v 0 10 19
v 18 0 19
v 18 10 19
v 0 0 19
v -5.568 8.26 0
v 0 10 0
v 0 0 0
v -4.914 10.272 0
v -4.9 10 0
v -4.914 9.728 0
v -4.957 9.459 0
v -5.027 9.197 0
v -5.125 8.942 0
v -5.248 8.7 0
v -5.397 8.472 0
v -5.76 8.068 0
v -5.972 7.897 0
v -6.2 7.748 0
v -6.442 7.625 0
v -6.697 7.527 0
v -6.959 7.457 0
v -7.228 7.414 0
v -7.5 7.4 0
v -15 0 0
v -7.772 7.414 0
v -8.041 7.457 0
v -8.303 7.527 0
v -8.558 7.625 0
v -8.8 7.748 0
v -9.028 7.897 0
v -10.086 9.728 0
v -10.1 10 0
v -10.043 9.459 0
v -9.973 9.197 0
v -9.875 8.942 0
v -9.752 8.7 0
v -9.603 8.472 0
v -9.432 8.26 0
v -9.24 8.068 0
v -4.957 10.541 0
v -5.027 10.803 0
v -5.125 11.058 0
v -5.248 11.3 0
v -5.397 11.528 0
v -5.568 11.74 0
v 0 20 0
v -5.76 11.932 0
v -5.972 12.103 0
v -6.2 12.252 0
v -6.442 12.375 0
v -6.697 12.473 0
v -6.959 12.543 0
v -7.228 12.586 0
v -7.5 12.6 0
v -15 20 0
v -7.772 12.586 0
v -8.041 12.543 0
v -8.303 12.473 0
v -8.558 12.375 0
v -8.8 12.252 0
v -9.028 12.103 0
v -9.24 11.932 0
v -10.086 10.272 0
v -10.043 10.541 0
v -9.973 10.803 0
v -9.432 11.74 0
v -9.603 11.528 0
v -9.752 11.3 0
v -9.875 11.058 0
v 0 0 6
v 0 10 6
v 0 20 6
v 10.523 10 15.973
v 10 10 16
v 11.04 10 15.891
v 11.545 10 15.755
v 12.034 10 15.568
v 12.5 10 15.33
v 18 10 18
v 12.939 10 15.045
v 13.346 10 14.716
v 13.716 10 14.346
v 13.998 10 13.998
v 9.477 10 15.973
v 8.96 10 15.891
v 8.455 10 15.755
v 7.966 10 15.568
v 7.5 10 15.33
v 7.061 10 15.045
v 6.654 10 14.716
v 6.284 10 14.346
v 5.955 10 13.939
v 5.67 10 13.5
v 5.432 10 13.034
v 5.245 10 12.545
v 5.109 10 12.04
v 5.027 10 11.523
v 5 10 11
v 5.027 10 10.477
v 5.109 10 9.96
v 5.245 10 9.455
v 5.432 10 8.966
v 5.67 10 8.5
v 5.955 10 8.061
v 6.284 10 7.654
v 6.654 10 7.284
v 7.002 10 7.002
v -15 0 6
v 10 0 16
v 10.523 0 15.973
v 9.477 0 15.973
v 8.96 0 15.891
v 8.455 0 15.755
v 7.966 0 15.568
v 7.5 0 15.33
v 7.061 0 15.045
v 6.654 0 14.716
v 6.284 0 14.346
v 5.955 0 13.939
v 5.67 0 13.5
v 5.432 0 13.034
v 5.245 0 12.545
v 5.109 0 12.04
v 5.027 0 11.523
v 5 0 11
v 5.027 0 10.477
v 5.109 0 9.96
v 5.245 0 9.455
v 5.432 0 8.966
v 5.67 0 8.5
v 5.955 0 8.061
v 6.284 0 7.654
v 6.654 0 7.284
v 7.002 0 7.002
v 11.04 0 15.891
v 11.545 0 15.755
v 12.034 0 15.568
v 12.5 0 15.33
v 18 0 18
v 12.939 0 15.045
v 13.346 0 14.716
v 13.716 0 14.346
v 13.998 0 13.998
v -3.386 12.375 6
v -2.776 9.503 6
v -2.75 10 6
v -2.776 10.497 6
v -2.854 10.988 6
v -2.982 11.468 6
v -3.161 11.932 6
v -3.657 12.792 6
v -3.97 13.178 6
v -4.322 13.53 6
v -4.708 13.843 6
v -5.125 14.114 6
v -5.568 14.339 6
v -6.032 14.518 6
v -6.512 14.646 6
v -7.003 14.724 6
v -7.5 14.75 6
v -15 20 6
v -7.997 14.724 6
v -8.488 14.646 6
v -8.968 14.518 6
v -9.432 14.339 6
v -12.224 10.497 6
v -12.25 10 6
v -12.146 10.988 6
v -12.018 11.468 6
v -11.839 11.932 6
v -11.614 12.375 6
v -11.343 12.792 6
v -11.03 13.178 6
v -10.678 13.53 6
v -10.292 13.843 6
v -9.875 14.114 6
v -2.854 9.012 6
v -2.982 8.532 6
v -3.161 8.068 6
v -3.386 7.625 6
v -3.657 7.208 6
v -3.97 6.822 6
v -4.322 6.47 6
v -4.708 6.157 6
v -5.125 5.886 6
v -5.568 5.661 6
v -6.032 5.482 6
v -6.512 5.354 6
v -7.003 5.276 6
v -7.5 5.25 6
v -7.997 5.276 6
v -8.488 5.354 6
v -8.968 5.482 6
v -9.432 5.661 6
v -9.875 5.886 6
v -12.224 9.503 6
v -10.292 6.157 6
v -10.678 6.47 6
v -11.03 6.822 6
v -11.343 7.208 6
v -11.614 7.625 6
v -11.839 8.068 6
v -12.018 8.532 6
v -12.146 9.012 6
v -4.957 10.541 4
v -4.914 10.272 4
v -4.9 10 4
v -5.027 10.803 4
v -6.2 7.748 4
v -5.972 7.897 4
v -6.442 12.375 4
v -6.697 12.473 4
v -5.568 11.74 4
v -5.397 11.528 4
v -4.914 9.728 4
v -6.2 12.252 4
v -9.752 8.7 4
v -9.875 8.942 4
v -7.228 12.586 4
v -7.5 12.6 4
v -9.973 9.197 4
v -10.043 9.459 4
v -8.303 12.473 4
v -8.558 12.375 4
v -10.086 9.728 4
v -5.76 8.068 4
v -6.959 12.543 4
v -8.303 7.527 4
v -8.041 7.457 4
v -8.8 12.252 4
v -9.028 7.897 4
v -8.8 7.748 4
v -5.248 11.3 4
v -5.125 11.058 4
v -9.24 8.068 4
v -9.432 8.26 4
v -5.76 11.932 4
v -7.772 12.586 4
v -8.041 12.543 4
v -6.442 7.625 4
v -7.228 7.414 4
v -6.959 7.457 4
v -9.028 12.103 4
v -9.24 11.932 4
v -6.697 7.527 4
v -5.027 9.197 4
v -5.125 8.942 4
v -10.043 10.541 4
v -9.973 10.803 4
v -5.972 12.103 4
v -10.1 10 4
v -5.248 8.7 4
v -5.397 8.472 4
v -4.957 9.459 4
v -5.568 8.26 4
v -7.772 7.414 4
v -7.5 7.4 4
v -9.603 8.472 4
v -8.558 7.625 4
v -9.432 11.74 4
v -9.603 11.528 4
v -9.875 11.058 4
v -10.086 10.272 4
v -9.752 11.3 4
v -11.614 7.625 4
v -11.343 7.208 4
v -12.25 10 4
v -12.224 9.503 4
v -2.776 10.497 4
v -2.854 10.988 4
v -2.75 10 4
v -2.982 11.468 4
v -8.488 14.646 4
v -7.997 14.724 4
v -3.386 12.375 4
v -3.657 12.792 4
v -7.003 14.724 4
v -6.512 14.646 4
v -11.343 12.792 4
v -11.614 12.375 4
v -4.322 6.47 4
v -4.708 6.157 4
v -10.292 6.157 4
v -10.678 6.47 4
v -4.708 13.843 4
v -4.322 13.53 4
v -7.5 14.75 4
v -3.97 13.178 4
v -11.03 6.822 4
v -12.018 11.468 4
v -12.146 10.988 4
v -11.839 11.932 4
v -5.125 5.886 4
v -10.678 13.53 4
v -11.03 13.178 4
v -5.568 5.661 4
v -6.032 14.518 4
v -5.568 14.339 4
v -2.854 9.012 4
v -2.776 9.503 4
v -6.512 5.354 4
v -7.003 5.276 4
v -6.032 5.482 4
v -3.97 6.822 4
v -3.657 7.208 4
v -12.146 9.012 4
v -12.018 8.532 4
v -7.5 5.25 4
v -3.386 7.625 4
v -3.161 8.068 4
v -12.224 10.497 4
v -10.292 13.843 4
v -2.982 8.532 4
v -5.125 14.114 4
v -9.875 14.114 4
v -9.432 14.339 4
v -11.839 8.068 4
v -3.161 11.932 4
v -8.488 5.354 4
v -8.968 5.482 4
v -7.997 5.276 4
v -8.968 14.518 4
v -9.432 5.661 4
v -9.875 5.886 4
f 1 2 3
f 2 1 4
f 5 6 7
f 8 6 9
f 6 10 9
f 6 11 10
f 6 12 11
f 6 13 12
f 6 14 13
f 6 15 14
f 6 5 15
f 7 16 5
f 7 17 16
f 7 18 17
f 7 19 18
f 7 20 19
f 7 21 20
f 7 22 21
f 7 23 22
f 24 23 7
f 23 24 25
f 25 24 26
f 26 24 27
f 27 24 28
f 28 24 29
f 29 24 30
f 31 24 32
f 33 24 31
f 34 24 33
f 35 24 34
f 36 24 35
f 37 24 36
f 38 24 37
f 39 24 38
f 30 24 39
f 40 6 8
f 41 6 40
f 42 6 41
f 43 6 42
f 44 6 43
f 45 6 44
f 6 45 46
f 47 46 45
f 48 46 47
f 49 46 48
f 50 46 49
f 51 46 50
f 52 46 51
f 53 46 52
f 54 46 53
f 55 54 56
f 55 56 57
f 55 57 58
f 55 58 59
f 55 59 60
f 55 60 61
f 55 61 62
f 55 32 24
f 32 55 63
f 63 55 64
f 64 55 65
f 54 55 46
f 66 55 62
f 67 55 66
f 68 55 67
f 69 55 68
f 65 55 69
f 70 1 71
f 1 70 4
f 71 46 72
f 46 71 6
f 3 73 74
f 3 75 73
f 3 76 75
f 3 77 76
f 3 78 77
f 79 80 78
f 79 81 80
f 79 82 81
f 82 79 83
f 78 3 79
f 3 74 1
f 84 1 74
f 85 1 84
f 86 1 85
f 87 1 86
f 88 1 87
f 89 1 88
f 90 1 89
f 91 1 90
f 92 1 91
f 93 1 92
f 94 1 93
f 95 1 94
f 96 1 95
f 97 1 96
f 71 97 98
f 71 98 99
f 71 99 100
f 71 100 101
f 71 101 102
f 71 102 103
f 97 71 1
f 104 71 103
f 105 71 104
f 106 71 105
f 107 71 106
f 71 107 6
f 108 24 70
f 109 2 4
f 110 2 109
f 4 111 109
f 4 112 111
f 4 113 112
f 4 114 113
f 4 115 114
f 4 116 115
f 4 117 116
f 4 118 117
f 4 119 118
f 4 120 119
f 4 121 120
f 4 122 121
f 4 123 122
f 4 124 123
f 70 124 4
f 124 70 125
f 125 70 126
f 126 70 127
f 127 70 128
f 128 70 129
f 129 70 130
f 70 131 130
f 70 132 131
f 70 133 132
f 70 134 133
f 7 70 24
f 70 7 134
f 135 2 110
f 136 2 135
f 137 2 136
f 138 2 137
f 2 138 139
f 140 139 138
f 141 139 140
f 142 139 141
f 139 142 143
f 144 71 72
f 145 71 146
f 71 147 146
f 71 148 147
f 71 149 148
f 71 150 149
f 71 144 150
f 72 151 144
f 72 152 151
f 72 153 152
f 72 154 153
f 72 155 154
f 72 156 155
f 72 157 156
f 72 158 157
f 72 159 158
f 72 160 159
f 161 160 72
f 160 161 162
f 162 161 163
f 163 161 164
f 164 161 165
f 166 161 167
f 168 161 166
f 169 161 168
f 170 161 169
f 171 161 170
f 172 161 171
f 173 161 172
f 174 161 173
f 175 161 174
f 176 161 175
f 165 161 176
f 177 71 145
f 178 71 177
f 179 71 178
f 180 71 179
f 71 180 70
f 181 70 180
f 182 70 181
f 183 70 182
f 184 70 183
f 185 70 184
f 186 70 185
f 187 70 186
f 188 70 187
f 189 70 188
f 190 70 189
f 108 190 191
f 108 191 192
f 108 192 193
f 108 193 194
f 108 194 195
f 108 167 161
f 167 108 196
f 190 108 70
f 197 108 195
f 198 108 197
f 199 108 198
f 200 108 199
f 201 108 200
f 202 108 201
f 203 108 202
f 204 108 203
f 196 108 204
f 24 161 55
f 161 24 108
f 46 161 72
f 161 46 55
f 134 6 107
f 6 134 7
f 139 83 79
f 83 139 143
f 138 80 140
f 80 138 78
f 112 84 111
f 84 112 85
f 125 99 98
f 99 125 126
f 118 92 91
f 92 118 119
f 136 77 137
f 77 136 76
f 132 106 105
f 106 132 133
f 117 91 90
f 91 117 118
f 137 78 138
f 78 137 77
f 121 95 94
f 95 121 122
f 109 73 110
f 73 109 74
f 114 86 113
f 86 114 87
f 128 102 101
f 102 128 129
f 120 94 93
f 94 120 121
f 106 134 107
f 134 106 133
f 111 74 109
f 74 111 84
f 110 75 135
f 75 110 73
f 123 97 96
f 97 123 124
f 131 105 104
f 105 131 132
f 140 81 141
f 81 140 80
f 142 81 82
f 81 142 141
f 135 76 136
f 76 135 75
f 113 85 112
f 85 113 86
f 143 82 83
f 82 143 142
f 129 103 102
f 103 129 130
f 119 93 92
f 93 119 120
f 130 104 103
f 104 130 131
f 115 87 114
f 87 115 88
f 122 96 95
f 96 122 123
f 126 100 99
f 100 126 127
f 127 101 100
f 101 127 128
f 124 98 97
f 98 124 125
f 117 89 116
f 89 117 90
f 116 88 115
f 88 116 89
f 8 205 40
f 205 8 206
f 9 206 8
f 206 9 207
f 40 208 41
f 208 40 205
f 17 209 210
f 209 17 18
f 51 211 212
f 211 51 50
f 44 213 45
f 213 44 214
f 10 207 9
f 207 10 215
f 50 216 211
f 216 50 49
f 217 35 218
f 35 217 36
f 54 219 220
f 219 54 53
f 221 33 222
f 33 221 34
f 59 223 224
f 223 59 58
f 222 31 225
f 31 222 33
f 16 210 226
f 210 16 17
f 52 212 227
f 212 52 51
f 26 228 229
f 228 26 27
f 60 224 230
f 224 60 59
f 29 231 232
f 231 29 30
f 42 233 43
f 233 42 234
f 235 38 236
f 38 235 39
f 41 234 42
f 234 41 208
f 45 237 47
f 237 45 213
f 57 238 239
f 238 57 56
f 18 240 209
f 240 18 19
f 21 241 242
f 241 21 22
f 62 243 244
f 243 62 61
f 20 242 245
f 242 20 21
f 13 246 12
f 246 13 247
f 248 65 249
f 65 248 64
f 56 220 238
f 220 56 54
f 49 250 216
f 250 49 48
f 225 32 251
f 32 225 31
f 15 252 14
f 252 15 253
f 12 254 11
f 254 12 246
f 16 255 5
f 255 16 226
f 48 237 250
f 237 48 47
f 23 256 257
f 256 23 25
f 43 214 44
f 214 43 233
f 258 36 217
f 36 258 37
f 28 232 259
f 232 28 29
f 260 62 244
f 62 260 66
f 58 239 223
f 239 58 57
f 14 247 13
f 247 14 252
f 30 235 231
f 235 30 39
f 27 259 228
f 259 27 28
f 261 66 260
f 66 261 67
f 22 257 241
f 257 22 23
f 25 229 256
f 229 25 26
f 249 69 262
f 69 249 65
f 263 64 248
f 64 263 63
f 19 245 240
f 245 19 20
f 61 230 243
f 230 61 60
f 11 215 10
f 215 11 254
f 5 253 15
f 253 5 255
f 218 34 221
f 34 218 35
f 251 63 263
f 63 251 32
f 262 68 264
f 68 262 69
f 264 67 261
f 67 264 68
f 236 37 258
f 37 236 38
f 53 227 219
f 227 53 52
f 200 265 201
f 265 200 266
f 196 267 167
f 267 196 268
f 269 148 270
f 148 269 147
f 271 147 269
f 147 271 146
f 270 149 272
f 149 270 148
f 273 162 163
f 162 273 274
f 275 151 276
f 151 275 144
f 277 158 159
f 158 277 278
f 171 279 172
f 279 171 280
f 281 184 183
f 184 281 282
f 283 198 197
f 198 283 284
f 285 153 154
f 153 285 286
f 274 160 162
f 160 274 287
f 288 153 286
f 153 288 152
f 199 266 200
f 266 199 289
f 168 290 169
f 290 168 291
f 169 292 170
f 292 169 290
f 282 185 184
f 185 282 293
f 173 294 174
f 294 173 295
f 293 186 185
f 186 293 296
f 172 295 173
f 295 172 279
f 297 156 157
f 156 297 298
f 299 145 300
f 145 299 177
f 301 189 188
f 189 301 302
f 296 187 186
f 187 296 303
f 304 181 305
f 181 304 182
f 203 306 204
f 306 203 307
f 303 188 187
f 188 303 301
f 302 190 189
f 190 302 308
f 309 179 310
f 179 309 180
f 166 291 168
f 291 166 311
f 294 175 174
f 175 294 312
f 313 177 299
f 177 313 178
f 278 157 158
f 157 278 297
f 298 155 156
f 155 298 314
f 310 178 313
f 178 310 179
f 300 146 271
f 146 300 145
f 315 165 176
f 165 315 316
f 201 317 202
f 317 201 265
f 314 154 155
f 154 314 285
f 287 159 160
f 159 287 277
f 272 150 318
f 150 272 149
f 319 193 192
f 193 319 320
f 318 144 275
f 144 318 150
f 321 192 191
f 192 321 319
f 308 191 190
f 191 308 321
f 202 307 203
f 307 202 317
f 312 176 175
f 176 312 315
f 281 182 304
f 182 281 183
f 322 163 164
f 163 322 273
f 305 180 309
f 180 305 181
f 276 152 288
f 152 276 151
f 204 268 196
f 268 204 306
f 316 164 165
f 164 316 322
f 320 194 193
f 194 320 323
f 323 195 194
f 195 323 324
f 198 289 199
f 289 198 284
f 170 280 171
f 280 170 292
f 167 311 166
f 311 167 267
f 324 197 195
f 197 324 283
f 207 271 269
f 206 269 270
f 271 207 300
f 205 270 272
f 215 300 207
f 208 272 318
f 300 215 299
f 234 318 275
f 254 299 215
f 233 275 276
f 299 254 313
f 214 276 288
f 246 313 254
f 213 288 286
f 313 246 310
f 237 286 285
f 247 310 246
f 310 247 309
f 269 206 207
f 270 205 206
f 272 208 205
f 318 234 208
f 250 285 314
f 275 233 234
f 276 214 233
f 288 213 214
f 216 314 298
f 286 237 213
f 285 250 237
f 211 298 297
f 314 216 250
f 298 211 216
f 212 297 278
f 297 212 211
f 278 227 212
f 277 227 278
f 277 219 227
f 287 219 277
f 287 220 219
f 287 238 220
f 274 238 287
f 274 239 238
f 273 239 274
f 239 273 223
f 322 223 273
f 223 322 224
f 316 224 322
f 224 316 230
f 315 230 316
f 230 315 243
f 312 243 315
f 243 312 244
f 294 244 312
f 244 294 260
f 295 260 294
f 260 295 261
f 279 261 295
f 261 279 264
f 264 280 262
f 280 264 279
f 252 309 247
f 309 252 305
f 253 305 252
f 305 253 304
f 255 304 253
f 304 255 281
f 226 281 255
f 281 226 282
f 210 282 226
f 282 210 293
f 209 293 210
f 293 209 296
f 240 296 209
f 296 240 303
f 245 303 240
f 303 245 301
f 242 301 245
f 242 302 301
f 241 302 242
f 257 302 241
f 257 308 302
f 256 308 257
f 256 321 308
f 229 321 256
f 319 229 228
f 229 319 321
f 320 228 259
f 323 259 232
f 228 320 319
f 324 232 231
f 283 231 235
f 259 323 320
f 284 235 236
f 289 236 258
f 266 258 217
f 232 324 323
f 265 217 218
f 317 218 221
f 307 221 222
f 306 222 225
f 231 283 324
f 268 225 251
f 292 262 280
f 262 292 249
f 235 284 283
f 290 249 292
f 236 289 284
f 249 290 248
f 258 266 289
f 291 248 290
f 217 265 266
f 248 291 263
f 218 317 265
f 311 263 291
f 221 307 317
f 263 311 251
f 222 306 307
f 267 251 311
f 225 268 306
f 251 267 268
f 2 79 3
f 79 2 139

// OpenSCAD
//cable guide top left
$fn=60;
difference() {
    union() {
        cube([20, 10, 19]);
        translate([-15, 0, 0]) cube([15, 20, 6]); 
    }
    //translate([-2, 2, 2]) cube([20, 16, 16]); 
    translate([0, -1, 0]) rotate([0, 45, 0]) cube([30, 30, 30]);
    translate([10, -2, 11]) rotate([-90, 0, 0]) cylinder(d=10, h=24);
    translate([-7.5, 10, -2]) cylinder(d=5.2, h=20);
    translate([-7.5, 10, 6-2]) cylinder(d=9.5, h=3.5);
    //cut
    translate([18, -1, 0]) cube([5, 22, 22]);
    /*string1 = str("cable");
        translate ([10, 0, 19]) rotate([0, 0, 90])
        linear_extrude(2.0) text(string1, size = 6, direction = "ltr", spacing = 1 ); */  
}
